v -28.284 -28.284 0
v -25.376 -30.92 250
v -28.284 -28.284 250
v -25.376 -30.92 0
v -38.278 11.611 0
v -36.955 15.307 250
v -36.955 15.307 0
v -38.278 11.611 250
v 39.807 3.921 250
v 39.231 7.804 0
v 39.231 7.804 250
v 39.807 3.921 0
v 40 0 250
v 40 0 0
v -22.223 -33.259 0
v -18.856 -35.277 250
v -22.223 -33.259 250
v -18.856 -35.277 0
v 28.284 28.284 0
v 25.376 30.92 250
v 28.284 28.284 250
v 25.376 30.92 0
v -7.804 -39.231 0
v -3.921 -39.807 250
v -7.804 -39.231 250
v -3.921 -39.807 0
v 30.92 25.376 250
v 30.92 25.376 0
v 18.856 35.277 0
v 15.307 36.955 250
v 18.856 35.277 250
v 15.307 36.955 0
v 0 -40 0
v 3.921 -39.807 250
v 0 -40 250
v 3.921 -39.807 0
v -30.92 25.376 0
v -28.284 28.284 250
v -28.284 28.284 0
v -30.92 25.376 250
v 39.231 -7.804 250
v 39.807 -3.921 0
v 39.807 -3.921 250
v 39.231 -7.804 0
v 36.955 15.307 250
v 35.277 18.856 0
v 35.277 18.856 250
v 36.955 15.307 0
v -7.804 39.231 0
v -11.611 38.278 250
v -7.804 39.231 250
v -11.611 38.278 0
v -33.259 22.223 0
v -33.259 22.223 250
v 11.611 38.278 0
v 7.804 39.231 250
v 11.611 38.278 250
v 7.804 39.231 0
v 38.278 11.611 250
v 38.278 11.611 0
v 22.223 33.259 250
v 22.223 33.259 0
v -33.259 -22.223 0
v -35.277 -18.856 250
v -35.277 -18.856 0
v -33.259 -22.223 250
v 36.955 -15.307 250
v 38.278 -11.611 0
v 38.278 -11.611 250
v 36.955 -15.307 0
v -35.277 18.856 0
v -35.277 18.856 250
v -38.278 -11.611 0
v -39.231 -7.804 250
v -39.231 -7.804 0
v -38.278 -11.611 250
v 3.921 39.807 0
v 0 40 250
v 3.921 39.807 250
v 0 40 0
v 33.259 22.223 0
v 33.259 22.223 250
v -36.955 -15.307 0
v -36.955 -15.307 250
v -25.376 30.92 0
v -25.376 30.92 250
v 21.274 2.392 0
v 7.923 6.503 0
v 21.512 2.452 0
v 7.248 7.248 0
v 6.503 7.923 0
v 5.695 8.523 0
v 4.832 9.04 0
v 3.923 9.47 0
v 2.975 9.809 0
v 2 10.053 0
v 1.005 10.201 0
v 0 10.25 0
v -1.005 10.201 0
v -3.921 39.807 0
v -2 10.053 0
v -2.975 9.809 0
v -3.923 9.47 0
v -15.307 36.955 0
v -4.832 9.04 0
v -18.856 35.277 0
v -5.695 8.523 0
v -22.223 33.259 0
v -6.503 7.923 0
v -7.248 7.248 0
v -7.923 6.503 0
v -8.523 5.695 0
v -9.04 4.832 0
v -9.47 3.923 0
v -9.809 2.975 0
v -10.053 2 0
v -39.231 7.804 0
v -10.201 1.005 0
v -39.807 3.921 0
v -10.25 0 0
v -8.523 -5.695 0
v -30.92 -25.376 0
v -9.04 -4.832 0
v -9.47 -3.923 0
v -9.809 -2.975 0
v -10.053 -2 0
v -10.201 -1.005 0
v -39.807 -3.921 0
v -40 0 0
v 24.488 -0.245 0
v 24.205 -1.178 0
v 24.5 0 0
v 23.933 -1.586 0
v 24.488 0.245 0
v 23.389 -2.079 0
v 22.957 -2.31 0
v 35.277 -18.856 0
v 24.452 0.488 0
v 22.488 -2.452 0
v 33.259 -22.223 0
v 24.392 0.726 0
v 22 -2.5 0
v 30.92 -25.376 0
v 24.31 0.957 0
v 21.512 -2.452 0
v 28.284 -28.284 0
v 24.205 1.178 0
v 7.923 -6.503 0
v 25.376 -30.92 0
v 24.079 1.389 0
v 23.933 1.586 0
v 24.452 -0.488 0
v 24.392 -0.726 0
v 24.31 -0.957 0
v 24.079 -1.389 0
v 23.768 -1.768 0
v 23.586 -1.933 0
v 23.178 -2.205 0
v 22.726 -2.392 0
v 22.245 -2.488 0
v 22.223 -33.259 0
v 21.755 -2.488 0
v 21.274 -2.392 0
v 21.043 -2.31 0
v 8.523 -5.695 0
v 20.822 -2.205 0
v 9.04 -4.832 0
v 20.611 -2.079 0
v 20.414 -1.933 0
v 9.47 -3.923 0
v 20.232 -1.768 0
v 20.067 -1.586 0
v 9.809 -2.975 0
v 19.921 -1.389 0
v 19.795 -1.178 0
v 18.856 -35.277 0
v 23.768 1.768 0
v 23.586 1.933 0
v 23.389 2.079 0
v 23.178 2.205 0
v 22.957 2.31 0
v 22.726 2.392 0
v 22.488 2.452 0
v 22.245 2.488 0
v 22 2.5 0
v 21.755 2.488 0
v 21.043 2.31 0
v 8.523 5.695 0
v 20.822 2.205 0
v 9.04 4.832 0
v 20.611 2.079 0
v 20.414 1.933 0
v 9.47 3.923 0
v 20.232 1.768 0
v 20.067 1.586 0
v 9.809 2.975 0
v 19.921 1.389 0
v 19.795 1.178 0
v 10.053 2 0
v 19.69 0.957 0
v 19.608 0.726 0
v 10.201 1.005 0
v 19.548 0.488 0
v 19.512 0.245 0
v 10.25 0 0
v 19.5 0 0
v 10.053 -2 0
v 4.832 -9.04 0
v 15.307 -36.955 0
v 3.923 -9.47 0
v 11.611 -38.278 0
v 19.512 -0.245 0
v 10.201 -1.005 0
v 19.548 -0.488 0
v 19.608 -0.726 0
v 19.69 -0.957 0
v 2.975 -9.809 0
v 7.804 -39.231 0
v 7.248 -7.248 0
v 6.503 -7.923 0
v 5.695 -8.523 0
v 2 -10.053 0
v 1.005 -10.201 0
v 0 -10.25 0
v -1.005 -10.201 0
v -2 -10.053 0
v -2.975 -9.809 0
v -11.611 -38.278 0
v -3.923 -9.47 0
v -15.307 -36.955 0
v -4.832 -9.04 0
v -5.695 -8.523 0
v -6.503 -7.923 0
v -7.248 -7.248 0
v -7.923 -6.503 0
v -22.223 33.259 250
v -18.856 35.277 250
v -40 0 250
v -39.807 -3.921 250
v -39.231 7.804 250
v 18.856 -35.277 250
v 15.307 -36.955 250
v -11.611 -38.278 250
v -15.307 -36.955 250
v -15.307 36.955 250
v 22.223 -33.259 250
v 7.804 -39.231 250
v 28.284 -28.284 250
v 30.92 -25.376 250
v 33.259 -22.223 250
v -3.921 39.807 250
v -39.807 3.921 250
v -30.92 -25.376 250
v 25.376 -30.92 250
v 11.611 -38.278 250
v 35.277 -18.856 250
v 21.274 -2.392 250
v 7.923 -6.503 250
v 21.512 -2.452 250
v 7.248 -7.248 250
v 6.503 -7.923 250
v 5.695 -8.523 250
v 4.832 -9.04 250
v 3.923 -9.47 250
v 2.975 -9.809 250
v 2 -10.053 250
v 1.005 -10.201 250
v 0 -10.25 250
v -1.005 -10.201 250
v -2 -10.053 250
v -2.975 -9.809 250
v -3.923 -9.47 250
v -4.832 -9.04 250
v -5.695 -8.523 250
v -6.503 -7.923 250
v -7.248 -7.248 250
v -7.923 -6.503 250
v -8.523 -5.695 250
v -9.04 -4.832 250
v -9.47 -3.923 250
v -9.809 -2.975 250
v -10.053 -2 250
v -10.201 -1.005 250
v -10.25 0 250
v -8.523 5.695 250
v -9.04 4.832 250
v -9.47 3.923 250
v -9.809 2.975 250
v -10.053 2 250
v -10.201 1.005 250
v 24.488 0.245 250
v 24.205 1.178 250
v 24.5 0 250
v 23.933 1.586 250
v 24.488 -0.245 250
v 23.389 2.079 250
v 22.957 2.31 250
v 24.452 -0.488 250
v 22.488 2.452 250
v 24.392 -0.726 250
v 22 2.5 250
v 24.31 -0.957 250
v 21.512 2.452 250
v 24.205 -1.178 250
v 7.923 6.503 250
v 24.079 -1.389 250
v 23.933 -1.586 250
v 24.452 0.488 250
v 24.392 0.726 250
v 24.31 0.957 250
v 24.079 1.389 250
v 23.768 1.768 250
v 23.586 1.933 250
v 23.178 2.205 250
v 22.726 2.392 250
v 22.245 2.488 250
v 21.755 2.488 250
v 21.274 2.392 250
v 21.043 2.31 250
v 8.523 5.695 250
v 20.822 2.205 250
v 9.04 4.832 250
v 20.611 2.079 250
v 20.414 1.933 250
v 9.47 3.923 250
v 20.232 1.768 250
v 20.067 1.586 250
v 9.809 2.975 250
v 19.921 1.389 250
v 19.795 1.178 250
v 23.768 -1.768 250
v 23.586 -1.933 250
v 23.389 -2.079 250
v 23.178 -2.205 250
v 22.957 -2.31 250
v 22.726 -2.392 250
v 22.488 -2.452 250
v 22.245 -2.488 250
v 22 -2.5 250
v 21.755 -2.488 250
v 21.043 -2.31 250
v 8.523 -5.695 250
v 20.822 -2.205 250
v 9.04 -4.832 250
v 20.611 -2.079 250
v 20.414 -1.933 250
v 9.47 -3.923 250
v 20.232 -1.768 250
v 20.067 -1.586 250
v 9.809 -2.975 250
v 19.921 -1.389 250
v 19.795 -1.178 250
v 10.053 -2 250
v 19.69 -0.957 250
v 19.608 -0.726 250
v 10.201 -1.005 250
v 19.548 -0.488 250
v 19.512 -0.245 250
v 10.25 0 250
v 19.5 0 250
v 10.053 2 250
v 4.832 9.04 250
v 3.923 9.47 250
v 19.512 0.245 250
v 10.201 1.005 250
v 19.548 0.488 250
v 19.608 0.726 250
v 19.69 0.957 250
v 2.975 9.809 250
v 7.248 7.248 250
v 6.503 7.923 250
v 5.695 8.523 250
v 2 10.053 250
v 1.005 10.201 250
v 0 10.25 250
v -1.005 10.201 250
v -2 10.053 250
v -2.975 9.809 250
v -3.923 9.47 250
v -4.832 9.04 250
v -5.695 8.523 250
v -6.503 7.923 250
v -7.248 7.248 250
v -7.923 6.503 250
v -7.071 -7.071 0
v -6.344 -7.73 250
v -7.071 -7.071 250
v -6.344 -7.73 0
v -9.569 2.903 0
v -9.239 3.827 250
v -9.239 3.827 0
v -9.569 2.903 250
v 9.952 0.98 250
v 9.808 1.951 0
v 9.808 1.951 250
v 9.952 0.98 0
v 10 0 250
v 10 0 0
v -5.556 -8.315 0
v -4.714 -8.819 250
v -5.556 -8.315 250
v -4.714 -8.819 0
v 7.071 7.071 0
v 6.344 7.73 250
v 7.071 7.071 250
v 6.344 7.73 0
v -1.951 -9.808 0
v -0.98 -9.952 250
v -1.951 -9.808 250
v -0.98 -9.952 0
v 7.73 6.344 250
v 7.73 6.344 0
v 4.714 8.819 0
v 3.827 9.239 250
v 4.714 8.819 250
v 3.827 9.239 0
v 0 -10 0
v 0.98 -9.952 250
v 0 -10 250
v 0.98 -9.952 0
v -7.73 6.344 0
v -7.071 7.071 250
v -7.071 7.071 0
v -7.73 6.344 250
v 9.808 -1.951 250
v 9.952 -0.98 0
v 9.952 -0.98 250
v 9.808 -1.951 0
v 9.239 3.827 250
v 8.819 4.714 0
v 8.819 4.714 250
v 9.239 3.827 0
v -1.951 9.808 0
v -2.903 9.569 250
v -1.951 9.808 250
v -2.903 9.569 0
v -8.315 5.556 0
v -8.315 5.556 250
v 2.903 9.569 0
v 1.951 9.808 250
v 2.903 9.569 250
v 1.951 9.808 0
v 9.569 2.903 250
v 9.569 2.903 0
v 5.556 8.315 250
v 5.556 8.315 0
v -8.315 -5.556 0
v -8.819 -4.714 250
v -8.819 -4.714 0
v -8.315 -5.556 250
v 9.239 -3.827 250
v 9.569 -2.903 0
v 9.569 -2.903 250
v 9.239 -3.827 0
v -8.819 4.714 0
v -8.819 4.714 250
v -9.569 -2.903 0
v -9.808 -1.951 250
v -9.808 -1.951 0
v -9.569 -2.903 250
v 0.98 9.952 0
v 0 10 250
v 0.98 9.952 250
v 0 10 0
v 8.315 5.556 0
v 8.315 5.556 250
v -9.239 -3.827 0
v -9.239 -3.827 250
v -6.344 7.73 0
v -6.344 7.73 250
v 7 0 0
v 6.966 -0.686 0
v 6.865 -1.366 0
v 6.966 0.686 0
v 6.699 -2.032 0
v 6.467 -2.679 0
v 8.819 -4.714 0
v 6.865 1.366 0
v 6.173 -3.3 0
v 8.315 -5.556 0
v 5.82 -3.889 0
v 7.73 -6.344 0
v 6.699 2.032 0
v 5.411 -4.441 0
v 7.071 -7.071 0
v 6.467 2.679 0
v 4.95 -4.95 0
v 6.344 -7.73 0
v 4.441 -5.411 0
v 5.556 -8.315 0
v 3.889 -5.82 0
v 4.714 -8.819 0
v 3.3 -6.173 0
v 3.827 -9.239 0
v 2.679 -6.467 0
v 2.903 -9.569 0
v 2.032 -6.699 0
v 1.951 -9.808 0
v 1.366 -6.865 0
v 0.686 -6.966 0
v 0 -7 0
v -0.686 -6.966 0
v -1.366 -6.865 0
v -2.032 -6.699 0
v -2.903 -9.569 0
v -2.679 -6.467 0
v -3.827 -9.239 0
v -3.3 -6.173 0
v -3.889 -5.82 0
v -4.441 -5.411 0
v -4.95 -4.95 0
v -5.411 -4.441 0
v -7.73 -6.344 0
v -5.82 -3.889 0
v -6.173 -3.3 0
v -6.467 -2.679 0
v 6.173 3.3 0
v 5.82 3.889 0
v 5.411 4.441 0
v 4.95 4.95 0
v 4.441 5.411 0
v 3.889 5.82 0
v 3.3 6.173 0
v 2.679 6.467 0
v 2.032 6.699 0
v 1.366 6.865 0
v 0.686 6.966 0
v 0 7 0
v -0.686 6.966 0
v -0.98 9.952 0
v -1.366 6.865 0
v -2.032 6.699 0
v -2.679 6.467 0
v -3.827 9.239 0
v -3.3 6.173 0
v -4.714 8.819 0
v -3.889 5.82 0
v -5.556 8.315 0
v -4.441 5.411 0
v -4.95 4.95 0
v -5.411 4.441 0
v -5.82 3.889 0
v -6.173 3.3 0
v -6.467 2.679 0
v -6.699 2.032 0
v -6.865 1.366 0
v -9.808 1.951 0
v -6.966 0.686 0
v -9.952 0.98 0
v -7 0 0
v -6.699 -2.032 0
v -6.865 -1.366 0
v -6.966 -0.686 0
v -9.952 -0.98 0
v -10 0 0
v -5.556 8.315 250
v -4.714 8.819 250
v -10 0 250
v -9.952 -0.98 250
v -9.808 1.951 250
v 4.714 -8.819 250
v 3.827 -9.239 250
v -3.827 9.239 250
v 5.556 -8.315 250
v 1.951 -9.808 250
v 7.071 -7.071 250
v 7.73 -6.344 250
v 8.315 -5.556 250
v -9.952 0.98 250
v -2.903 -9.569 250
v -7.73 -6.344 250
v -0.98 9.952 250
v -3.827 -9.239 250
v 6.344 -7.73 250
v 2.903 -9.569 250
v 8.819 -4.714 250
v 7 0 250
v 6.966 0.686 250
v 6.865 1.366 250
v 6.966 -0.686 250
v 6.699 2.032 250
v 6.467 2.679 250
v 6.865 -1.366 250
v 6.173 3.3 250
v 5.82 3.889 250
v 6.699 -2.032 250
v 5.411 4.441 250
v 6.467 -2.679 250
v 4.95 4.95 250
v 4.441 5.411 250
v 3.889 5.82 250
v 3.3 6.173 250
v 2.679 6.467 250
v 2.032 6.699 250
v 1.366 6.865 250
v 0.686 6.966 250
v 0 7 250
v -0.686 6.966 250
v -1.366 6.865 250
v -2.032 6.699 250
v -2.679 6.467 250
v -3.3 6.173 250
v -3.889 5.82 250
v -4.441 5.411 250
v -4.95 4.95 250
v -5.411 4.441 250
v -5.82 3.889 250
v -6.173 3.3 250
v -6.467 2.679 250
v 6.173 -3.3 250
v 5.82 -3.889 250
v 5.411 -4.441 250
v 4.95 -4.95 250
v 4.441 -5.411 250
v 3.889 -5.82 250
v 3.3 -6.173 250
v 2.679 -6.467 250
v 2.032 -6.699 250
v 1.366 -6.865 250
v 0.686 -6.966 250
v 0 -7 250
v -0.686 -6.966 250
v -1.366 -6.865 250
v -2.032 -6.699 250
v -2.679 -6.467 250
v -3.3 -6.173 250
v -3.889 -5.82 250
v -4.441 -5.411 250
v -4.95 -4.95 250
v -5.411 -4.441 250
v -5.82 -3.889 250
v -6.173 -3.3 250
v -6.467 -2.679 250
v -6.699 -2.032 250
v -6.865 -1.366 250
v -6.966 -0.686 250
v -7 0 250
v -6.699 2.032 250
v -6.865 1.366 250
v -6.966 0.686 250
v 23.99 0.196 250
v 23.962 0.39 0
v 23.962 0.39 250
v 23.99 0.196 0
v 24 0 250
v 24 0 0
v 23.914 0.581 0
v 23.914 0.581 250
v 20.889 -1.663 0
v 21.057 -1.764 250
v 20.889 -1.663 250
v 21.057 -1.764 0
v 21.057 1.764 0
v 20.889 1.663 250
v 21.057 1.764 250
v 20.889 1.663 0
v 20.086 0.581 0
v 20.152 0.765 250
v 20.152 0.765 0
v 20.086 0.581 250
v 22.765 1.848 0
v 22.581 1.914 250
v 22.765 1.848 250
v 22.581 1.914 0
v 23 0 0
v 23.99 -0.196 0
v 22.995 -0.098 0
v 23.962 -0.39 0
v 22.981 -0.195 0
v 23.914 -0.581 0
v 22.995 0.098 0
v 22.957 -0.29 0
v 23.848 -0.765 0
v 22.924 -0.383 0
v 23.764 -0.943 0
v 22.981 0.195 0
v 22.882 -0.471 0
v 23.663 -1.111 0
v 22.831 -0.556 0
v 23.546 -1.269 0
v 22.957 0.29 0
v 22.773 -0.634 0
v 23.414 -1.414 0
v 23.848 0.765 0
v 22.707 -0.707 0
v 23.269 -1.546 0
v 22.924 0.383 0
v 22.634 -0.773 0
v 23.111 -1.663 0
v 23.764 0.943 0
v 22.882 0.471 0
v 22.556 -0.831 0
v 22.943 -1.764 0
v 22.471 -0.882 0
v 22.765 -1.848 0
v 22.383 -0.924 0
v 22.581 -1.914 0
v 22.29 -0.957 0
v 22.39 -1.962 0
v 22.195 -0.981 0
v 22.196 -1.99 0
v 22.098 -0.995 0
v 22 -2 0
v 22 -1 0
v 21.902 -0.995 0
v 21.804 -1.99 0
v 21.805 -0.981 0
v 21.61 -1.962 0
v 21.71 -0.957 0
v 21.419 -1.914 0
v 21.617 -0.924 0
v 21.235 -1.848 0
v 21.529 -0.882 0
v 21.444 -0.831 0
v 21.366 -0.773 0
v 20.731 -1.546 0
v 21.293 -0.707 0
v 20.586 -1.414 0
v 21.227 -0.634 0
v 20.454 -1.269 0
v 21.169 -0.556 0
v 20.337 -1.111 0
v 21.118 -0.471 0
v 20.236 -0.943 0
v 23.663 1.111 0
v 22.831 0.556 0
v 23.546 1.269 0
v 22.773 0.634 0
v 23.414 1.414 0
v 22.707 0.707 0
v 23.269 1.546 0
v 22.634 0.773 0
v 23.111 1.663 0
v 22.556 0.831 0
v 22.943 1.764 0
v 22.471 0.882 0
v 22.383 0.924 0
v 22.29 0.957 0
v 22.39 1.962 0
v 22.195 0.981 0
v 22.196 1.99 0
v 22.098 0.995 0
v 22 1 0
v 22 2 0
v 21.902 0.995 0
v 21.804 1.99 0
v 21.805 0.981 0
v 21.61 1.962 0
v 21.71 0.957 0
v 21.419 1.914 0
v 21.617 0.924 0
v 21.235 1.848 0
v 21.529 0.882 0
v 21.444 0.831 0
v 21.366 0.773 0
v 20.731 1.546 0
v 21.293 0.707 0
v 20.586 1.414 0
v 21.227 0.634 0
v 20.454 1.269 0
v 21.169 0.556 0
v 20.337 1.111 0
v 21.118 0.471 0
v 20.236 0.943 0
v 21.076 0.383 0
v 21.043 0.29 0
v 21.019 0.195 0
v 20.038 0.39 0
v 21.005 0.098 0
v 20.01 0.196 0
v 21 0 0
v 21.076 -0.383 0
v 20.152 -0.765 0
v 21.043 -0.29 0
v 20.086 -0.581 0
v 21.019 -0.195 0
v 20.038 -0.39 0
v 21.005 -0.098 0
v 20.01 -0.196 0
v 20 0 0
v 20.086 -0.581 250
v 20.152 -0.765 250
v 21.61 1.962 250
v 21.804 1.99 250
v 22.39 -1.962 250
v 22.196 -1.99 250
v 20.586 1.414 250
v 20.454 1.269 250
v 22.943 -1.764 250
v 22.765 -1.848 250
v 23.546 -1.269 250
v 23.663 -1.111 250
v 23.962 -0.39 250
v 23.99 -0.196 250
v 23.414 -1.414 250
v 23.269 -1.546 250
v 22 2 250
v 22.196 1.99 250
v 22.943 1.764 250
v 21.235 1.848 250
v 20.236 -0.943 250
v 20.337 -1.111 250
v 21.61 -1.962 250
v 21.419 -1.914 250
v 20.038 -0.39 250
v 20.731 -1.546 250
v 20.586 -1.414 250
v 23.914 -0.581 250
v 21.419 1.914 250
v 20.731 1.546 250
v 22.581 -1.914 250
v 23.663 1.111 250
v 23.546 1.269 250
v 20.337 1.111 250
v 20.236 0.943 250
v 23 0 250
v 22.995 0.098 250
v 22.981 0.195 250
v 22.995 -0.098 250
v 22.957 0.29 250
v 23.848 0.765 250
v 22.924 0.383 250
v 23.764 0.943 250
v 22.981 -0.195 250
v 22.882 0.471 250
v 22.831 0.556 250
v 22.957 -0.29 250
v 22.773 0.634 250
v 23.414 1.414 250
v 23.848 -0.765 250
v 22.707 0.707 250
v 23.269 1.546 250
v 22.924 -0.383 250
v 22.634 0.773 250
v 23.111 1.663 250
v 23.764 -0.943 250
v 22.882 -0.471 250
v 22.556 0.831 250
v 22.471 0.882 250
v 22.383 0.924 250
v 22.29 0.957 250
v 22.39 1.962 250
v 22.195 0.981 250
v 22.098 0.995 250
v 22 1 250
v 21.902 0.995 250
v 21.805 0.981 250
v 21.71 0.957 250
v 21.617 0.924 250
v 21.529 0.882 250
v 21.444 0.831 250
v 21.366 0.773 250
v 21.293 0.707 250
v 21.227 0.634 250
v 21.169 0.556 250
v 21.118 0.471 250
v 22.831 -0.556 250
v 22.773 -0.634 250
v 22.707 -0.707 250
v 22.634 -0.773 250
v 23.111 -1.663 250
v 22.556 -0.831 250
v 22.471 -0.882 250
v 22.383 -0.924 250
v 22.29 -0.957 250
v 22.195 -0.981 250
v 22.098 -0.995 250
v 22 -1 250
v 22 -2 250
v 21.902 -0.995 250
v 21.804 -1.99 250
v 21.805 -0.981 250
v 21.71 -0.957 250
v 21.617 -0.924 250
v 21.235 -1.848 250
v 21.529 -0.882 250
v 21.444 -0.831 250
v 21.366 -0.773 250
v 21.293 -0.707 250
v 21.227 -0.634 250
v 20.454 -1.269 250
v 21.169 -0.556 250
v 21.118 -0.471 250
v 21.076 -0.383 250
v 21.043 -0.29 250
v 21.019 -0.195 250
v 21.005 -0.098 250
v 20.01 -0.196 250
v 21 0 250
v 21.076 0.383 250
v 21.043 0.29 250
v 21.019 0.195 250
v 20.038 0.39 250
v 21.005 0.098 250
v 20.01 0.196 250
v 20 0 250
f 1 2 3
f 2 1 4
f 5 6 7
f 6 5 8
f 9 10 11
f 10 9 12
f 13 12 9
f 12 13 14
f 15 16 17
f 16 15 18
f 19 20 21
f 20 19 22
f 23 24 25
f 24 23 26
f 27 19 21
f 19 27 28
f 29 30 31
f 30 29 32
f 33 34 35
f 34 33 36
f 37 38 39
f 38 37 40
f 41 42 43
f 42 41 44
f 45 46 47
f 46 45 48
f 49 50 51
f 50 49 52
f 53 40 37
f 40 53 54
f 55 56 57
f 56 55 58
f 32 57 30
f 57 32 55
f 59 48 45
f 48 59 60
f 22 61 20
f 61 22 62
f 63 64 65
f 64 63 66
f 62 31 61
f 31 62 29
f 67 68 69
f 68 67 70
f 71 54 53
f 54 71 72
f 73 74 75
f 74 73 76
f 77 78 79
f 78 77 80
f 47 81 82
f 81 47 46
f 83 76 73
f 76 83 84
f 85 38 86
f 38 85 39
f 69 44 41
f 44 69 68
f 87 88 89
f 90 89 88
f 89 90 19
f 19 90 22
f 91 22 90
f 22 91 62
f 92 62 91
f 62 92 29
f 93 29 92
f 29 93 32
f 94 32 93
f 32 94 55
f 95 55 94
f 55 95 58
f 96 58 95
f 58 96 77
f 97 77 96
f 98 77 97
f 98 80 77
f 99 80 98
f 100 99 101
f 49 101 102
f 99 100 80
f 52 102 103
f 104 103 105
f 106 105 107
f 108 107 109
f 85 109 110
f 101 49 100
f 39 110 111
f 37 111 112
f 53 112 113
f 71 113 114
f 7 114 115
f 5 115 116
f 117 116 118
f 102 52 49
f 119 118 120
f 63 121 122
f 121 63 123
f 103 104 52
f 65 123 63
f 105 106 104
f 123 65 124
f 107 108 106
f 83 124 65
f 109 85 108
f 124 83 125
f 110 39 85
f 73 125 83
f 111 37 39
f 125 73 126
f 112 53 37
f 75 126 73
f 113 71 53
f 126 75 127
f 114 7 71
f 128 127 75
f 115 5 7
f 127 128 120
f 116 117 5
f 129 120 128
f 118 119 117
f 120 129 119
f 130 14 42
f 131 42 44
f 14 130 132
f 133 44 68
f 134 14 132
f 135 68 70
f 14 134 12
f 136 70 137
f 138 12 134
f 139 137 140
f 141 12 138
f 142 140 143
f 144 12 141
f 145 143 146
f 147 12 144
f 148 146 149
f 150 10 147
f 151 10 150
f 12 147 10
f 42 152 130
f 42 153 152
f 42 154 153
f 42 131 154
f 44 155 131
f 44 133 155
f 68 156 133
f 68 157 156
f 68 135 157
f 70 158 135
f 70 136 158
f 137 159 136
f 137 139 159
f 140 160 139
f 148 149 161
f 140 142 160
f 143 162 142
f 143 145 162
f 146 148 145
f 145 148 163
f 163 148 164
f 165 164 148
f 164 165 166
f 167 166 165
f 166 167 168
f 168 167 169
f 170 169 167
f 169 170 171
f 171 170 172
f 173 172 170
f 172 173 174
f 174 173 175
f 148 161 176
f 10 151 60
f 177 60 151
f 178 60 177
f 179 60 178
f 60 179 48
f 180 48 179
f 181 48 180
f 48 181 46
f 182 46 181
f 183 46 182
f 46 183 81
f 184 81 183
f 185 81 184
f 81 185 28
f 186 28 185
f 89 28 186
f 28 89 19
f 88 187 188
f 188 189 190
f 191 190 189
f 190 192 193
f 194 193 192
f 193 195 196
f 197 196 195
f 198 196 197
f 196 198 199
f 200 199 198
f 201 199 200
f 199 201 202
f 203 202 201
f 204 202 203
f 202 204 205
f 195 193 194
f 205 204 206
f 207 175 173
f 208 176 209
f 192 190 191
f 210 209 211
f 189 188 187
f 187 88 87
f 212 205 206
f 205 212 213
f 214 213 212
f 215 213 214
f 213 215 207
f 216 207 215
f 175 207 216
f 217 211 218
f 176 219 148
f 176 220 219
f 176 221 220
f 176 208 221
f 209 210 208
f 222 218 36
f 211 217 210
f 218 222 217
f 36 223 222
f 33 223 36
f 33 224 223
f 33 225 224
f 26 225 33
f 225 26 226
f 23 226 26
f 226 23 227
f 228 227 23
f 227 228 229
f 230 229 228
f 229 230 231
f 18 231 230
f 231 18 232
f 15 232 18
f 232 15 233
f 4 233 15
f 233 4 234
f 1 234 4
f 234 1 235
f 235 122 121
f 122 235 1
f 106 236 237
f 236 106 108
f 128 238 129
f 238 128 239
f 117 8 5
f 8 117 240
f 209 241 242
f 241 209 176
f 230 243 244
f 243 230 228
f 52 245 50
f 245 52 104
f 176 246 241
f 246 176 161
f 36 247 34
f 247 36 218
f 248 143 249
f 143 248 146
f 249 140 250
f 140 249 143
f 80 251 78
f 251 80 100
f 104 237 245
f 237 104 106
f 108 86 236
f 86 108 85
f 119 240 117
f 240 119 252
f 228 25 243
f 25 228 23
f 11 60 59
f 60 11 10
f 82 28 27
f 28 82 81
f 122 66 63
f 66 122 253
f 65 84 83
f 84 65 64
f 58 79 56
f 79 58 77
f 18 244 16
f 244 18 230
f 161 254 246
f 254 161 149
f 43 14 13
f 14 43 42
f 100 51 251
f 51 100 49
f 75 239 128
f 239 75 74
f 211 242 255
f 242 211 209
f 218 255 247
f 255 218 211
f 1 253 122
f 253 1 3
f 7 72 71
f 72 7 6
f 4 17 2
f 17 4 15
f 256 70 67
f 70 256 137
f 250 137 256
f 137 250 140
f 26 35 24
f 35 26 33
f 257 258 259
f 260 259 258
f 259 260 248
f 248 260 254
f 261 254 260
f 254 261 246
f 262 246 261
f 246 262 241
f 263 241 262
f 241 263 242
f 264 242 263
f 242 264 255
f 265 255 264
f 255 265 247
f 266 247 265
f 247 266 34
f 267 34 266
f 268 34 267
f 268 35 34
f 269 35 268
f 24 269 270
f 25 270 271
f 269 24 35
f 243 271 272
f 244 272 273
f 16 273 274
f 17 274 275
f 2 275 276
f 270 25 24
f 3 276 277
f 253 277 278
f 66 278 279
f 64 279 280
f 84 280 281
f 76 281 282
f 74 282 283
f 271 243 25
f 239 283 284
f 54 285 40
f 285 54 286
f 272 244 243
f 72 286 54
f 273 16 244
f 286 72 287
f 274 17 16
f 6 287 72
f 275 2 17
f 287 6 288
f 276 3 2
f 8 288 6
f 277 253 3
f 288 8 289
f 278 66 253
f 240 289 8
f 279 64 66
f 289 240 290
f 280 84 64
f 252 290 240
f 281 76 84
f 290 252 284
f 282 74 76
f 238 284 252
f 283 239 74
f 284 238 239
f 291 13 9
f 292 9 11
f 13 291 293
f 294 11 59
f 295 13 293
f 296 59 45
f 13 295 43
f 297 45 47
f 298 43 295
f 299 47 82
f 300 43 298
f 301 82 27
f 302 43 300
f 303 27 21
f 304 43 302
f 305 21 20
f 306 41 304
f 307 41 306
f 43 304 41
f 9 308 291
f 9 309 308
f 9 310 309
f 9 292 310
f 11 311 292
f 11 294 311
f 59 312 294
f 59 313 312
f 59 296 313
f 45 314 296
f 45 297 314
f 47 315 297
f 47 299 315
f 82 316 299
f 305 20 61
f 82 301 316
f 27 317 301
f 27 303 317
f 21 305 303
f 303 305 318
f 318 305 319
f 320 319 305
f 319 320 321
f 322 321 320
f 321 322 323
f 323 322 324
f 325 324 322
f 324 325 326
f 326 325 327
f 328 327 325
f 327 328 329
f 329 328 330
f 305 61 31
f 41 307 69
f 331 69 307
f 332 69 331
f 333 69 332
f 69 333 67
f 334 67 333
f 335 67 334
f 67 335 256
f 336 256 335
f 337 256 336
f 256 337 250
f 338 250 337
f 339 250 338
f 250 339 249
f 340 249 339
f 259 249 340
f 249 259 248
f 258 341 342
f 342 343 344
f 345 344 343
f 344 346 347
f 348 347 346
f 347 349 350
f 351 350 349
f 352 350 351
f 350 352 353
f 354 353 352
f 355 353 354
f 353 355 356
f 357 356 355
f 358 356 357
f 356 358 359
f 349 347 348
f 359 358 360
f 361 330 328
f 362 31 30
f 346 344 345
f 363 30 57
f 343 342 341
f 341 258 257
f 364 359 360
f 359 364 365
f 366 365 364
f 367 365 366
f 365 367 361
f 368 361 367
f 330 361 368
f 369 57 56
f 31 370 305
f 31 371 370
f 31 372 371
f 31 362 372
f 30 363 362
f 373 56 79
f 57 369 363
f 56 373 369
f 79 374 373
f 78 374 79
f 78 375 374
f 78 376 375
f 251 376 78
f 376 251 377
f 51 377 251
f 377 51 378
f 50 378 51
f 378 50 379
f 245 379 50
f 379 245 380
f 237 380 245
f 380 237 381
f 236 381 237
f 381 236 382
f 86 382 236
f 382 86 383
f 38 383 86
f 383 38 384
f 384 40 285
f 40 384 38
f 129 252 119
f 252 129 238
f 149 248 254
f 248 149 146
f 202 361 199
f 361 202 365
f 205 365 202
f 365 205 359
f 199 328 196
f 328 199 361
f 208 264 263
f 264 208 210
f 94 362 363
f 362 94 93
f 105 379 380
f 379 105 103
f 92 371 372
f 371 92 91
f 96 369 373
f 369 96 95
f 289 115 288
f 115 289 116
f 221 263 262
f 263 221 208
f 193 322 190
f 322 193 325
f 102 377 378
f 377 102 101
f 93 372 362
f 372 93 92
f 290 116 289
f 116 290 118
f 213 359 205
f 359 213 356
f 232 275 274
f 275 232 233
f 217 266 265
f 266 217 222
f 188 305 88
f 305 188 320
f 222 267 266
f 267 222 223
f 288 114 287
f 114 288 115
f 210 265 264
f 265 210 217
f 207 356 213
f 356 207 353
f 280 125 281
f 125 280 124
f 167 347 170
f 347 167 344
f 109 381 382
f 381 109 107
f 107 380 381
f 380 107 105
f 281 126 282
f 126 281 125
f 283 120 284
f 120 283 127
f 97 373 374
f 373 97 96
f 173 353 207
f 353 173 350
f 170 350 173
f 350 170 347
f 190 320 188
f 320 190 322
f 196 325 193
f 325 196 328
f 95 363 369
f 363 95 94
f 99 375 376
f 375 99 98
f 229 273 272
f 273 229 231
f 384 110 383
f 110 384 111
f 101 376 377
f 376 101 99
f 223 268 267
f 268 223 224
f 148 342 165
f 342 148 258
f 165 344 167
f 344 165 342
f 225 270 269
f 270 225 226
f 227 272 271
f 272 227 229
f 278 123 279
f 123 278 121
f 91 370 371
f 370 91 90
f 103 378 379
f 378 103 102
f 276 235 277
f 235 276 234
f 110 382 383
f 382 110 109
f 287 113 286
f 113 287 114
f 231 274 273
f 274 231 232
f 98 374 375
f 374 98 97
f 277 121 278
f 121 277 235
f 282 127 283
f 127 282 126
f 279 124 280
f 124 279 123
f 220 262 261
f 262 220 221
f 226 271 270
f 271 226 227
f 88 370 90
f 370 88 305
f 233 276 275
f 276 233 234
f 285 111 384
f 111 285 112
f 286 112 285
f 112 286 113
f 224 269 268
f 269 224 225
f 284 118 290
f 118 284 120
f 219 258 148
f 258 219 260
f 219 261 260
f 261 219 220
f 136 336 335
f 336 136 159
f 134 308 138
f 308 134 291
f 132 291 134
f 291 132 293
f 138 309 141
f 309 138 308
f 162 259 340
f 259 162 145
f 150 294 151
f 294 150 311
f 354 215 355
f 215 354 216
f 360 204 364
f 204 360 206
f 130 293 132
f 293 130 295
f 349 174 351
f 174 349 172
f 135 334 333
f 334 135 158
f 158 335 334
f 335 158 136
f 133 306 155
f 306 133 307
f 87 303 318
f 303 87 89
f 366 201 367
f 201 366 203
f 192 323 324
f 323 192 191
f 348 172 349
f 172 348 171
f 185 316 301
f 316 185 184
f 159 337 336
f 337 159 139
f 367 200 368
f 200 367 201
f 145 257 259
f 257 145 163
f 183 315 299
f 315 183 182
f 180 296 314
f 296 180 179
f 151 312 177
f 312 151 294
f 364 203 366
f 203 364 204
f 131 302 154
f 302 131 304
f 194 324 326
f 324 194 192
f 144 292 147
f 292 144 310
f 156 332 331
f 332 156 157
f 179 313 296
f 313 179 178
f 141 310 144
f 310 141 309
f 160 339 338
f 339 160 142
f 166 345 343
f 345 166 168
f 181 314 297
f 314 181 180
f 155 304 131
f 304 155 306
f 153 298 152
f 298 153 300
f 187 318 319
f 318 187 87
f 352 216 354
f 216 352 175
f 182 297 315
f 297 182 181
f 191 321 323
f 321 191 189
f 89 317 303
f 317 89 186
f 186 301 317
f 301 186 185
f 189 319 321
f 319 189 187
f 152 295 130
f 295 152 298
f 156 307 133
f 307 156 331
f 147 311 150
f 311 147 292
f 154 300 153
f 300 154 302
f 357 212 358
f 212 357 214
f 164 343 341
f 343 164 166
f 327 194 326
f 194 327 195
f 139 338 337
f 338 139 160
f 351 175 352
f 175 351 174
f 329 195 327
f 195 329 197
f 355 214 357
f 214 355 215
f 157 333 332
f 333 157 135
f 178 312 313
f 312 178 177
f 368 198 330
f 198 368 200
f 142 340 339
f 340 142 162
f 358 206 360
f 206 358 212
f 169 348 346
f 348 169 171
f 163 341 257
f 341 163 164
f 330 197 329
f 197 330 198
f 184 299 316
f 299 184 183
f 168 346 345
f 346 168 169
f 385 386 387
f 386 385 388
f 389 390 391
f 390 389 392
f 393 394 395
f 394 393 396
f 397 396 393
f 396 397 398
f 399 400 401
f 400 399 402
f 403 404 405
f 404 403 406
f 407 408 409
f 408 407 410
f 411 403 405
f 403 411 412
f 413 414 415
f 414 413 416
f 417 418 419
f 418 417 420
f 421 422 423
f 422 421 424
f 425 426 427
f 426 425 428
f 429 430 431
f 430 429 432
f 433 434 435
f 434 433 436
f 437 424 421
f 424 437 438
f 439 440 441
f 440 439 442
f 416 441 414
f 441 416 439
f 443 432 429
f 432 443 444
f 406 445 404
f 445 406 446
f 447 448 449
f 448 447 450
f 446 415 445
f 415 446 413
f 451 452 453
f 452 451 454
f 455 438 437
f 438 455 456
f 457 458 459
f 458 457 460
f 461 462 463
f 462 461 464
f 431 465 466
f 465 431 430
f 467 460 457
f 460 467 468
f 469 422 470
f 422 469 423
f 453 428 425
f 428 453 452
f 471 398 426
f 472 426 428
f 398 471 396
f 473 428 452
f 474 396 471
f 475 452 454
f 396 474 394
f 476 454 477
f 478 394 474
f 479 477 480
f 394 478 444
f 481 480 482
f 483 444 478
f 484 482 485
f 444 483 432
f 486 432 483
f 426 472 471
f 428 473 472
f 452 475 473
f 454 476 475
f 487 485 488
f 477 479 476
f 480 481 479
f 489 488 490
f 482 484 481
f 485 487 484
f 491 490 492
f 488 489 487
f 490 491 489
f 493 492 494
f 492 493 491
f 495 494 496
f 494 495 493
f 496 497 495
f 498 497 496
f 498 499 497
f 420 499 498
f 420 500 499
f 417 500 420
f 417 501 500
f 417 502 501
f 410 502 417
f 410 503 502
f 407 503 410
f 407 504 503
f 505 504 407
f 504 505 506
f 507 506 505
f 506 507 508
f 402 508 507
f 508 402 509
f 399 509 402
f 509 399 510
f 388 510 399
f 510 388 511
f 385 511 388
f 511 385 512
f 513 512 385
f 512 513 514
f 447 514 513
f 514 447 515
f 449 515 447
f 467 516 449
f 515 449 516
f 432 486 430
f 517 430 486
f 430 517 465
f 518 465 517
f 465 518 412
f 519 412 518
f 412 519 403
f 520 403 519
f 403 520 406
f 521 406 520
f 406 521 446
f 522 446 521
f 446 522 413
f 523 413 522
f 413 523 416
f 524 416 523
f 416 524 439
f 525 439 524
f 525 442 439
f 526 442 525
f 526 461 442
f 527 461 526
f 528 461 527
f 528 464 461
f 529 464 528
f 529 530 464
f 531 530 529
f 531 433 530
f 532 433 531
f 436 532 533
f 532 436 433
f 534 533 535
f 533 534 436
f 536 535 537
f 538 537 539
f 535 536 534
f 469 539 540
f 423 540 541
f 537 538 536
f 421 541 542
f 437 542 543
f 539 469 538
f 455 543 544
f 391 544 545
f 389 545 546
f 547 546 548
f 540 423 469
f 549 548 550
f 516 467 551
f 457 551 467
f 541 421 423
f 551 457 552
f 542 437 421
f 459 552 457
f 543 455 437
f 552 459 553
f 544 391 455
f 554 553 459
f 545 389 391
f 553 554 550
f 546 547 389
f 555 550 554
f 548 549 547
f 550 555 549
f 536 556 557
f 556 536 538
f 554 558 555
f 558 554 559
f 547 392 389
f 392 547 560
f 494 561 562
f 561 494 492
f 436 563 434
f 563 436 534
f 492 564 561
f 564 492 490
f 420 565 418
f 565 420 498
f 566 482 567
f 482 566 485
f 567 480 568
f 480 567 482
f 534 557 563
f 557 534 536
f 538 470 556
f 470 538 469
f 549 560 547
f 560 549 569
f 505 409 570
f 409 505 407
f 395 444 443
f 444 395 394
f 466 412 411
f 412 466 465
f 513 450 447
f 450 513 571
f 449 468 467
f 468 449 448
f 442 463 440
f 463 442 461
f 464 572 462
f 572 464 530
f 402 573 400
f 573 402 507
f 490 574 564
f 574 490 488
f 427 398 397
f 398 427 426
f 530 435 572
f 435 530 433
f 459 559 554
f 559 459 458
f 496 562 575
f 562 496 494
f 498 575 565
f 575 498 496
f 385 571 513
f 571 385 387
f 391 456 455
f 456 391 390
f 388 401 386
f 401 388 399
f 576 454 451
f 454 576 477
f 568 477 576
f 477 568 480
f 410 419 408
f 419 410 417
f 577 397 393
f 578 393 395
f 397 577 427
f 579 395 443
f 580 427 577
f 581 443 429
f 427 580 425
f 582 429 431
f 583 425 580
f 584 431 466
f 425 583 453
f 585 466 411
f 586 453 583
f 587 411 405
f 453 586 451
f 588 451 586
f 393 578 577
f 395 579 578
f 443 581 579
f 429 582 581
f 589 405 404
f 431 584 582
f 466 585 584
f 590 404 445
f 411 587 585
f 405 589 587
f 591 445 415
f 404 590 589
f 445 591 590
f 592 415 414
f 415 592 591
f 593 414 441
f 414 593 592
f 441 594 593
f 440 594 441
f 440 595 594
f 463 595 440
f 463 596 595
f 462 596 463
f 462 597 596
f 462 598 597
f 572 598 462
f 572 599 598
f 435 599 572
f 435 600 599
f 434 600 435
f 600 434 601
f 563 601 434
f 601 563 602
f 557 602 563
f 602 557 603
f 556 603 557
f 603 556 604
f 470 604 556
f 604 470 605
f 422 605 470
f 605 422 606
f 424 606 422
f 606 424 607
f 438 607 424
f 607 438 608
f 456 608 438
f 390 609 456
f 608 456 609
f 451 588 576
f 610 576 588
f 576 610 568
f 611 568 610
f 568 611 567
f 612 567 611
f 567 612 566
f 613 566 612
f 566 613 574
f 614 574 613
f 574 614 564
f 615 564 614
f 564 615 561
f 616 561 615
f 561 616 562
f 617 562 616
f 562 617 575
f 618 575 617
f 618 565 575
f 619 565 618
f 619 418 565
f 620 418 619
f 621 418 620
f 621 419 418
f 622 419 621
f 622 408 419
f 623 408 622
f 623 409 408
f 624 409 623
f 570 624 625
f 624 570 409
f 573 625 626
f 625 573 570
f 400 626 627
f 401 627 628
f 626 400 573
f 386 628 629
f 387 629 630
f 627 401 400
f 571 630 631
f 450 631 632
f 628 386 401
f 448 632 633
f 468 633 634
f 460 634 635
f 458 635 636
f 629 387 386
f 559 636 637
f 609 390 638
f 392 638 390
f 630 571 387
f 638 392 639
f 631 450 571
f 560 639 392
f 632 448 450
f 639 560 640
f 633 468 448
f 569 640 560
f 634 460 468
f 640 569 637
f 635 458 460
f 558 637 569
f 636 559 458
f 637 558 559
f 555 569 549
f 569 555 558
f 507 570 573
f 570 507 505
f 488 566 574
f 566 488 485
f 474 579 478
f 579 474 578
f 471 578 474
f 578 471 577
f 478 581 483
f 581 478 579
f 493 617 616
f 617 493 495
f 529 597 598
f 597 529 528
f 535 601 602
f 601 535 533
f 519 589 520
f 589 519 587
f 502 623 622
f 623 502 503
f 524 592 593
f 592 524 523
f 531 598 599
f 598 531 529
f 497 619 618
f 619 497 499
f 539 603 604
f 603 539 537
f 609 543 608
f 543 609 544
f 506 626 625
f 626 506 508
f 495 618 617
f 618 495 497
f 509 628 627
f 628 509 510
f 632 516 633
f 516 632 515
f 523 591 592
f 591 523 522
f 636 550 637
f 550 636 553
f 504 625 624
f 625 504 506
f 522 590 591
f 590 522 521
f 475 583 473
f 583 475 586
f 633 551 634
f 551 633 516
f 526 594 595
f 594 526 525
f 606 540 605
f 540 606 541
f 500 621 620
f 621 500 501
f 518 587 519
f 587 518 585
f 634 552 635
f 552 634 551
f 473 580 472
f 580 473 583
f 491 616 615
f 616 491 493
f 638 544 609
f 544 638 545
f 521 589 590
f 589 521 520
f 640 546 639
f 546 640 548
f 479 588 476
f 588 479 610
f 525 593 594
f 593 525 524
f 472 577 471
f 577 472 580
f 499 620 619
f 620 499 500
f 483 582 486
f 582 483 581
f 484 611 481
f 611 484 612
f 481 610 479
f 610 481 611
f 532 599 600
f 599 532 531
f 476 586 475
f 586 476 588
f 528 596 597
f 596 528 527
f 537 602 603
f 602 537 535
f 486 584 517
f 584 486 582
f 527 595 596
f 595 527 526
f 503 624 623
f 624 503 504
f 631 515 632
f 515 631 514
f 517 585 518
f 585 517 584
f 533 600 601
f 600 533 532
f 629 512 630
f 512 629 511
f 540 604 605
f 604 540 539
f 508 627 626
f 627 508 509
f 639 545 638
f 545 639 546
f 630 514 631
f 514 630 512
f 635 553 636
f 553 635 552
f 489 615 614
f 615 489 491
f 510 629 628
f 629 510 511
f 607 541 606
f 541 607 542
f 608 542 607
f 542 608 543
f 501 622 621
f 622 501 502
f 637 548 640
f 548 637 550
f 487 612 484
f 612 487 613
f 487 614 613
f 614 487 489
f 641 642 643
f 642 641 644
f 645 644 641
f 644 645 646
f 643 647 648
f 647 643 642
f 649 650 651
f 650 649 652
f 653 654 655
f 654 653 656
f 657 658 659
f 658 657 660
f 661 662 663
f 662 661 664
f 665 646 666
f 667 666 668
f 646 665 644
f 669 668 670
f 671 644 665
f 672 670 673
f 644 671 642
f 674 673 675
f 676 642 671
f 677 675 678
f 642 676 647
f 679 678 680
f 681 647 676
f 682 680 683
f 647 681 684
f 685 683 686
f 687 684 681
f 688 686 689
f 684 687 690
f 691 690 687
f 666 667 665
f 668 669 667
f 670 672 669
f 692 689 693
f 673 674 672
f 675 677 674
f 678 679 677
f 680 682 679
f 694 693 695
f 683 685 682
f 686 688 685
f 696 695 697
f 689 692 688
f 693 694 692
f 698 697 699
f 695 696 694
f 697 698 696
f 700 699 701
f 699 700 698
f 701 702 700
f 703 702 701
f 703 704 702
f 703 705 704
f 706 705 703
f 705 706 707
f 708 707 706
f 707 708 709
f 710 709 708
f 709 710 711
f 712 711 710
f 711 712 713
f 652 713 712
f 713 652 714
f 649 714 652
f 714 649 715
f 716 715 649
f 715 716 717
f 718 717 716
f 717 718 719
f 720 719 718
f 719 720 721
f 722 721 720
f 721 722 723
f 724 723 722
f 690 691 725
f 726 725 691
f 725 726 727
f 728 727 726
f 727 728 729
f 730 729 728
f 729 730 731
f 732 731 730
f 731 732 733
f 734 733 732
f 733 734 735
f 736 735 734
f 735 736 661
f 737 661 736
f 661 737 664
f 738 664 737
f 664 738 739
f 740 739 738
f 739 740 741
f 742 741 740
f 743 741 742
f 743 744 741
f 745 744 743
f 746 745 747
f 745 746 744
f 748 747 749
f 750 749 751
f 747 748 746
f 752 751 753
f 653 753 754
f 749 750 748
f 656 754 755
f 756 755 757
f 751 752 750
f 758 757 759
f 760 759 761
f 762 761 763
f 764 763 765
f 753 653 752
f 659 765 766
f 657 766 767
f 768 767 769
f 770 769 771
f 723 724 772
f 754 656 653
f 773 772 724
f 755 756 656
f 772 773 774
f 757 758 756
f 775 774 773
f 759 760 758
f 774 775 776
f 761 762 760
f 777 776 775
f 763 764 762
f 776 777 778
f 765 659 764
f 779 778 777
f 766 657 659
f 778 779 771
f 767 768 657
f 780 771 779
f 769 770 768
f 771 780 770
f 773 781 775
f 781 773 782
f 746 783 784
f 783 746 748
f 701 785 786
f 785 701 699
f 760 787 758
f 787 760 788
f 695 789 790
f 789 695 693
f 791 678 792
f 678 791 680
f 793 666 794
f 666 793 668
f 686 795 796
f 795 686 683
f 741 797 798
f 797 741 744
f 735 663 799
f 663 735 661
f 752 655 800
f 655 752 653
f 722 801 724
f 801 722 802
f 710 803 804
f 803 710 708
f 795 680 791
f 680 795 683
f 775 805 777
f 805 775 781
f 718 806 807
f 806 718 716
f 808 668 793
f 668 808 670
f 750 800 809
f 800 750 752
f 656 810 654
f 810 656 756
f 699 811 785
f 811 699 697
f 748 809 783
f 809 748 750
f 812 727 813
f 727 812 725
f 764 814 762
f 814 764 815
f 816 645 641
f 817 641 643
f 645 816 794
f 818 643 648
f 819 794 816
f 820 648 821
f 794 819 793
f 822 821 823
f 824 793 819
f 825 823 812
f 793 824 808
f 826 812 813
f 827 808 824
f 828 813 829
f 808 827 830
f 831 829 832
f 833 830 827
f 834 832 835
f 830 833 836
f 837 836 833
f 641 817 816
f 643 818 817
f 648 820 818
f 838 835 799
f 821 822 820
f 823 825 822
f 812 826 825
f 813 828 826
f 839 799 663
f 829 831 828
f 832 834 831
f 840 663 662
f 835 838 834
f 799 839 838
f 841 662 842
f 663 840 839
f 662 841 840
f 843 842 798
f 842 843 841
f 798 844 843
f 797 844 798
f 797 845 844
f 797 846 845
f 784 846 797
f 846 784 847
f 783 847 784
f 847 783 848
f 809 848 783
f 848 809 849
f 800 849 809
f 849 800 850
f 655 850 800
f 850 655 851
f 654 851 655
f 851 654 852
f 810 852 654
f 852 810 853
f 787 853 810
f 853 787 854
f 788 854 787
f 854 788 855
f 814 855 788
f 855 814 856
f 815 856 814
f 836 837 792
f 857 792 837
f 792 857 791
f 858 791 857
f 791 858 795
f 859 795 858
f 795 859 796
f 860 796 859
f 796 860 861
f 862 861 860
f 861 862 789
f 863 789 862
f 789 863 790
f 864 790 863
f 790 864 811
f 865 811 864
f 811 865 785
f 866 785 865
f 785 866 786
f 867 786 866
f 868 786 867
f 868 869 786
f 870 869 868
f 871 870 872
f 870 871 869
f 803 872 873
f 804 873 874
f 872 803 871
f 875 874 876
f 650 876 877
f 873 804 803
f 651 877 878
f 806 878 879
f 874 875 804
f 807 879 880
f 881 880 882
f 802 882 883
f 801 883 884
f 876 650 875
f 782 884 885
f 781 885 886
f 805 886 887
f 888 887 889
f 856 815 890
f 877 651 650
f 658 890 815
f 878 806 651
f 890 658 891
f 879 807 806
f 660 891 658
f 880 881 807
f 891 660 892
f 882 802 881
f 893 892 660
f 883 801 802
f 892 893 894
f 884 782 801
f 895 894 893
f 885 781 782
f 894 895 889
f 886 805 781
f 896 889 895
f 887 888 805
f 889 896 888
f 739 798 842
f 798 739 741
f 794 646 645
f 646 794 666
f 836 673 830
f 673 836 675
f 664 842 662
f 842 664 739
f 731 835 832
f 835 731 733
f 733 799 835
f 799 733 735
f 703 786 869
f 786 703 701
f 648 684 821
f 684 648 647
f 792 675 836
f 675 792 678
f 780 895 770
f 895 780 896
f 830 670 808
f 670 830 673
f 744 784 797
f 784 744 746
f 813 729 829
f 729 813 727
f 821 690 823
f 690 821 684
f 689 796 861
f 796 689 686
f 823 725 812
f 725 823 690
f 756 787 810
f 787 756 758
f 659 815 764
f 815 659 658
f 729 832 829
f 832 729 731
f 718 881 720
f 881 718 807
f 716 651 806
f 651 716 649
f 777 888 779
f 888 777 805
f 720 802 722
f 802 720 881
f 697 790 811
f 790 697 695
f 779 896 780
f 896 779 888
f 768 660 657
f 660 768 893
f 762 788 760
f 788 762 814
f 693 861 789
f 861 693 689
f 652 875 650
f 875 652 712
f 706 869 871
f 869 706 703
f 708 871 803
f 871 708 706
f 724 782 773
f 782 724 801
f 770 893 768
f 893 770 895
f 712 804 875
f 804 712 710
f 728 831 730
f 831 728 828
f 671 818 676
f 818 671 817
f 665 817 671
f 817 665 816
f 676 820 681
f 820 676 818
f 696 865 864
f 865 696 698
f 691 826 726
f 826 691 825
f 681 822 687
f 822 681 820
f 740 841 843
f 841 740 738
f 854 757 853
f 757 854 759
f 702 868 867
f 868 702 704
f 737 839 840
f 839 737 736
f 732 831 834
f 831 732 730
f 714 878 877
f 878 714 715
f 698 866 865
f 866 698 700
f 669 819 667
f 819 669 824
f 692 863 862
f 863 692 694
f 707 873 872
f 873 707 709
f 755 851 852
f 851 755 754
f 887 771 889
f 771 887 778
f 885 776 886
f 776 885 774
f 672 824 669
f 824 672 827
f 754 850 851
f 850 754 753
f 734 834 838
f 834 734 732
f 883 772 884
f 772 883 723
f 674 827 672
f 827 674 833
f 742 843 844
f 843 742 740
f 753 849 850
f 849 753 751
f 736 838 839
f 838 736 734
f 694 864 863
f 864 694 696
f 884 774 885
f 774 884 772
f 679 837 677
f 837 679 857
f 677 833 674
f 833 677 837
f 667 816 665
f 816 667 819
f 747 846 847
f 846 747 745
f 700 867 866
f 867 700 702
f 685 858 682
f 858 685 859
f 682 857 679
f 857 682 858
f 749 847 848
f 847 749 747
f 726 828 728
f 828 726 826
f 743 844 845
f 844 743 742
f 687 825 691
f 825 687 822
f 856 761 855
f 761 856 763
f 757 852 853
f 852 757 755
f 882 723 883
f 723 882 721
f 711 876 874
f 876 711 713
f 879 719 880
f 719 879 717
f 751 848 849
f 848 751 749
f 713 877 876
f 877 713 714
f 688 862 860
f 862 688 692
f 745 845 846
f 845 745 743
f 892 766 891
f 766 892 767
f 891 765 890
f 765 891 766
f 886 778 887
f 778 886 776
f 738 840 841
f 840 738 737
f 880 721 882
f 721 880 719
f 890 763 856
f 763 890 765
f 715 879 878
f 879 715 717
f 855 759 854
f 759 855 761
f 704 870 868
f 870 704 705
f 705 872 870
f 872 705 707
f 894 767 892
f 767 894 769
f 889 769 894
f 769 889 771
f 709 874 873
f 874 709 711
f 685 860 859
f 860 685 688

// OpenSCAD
// ============================================================
// Smart Tourniquet System — Phantom Lengan (Validation Rig)
// Kelompok 19 — Desain Proyek Teknik Elektro, Komputer, Biomedik 2
// PIC: Grace Kezia Siregar
// render_mode: "visual" / "mold_bottom" / "fixture"
// ============================================================

$fn = 64;

limb_length = 250; limb_od = 80; bone_od = 20; bone_wall = 3;
artery_od = 4; artery_wall = 1; artery_offset_from_center = 22;
fixture_base_w = 140; fixture_base_d = 100; fixture_base_h = 10;
fixture_post_d = 25; fixture_post_h = 60;

module bone_pvc() {
    difference() {
        cylinder(h=limb_length, d=bone_od);
        translate([0,0,-1]) cylinder(h=limb_length+2, d=bone_od-2*bone_wall);
    }
}
module artery_tube(offset_angle=90) {
    x = artery_offset_from_center*cos(offset_angle);
    y = artery_offset_from_center*sin(offset_angle);
    translate([x,y,0])
        difference() {
            cylinder(h=limb_length, d=artery_od);
            translate([0,0,-1]) cylinder(h=limb_length+2, d=artery_od-2*artery_wall);
        }
}
module soft_tissue_solid() { cylinder(h=limb_length, d=limb_od); }

module phantom_arm_visual() {
    color("Bisque", 0.5)
        difference() {
            soft_tissue_solid();
            translate([0,0,-1]) cylinder(h=limb_length+2, d=bone_od+0.5);
            translate([artery_offset_from_center,0,-1]) cylinder(h=limb_length+2, d=artery_od+1);
        }
    color("Ivory") bone_pvc();
    color("Red") artery_tube(offset_angle=0);
}

module mold_half(is_top=false) {
    mold_wall = 5;
    difference() {
        cylinder(h=limb_length, d=limb_od+2*mold_wall);
        translate([0,0,-1]) cylinder(h=limb_length+2, d=limb_od);
        translate(is_top ? [-(limb_od/2+mold_wall+1), -(limb_od+2*mold_wall), -1]
                          : [-(limb_od/2+mold_wall+1), 0, -1])
            cube([limb_od+2*mold_wall+2, limb_od+2*mold_wall, limb_length+2]);
    }
}
module mold_alignment_holes() {
    translate([0,0,-1]) cylinder(h=limb_length+2, d=bone_od+0.3);
    translate([artery_offset_from_center,0,-1]) cylinder(h=limb_length+2, d=artery_od+0.3);
}
module mold_bottom_final() {
    difference() { mold_half(is_top=false); mold_alignment_holes(); }
}
module fixture_stand() {
    translate([-fixture_base_w/2, -fixture_base_d/2, 0]) cube([fixture_base_w, fixture_base_d, fixture_base_h]);
    for (side=[-1,1])
        translate([side*(limb_od*0.28), 0, fixture_base_h])
            rotate([0, side*20, 0]) cylinder(h=fixture_post_h, d=fixture_post_d/2);
}

render_mode = "visual";
if (render_mode == "visual") { phantom_arm_visual(); }
else if (render_mode == "mold_bottom") { mold_bottom_final(); }
else if (render_mode == "fixture") { fixture_stand(); }
